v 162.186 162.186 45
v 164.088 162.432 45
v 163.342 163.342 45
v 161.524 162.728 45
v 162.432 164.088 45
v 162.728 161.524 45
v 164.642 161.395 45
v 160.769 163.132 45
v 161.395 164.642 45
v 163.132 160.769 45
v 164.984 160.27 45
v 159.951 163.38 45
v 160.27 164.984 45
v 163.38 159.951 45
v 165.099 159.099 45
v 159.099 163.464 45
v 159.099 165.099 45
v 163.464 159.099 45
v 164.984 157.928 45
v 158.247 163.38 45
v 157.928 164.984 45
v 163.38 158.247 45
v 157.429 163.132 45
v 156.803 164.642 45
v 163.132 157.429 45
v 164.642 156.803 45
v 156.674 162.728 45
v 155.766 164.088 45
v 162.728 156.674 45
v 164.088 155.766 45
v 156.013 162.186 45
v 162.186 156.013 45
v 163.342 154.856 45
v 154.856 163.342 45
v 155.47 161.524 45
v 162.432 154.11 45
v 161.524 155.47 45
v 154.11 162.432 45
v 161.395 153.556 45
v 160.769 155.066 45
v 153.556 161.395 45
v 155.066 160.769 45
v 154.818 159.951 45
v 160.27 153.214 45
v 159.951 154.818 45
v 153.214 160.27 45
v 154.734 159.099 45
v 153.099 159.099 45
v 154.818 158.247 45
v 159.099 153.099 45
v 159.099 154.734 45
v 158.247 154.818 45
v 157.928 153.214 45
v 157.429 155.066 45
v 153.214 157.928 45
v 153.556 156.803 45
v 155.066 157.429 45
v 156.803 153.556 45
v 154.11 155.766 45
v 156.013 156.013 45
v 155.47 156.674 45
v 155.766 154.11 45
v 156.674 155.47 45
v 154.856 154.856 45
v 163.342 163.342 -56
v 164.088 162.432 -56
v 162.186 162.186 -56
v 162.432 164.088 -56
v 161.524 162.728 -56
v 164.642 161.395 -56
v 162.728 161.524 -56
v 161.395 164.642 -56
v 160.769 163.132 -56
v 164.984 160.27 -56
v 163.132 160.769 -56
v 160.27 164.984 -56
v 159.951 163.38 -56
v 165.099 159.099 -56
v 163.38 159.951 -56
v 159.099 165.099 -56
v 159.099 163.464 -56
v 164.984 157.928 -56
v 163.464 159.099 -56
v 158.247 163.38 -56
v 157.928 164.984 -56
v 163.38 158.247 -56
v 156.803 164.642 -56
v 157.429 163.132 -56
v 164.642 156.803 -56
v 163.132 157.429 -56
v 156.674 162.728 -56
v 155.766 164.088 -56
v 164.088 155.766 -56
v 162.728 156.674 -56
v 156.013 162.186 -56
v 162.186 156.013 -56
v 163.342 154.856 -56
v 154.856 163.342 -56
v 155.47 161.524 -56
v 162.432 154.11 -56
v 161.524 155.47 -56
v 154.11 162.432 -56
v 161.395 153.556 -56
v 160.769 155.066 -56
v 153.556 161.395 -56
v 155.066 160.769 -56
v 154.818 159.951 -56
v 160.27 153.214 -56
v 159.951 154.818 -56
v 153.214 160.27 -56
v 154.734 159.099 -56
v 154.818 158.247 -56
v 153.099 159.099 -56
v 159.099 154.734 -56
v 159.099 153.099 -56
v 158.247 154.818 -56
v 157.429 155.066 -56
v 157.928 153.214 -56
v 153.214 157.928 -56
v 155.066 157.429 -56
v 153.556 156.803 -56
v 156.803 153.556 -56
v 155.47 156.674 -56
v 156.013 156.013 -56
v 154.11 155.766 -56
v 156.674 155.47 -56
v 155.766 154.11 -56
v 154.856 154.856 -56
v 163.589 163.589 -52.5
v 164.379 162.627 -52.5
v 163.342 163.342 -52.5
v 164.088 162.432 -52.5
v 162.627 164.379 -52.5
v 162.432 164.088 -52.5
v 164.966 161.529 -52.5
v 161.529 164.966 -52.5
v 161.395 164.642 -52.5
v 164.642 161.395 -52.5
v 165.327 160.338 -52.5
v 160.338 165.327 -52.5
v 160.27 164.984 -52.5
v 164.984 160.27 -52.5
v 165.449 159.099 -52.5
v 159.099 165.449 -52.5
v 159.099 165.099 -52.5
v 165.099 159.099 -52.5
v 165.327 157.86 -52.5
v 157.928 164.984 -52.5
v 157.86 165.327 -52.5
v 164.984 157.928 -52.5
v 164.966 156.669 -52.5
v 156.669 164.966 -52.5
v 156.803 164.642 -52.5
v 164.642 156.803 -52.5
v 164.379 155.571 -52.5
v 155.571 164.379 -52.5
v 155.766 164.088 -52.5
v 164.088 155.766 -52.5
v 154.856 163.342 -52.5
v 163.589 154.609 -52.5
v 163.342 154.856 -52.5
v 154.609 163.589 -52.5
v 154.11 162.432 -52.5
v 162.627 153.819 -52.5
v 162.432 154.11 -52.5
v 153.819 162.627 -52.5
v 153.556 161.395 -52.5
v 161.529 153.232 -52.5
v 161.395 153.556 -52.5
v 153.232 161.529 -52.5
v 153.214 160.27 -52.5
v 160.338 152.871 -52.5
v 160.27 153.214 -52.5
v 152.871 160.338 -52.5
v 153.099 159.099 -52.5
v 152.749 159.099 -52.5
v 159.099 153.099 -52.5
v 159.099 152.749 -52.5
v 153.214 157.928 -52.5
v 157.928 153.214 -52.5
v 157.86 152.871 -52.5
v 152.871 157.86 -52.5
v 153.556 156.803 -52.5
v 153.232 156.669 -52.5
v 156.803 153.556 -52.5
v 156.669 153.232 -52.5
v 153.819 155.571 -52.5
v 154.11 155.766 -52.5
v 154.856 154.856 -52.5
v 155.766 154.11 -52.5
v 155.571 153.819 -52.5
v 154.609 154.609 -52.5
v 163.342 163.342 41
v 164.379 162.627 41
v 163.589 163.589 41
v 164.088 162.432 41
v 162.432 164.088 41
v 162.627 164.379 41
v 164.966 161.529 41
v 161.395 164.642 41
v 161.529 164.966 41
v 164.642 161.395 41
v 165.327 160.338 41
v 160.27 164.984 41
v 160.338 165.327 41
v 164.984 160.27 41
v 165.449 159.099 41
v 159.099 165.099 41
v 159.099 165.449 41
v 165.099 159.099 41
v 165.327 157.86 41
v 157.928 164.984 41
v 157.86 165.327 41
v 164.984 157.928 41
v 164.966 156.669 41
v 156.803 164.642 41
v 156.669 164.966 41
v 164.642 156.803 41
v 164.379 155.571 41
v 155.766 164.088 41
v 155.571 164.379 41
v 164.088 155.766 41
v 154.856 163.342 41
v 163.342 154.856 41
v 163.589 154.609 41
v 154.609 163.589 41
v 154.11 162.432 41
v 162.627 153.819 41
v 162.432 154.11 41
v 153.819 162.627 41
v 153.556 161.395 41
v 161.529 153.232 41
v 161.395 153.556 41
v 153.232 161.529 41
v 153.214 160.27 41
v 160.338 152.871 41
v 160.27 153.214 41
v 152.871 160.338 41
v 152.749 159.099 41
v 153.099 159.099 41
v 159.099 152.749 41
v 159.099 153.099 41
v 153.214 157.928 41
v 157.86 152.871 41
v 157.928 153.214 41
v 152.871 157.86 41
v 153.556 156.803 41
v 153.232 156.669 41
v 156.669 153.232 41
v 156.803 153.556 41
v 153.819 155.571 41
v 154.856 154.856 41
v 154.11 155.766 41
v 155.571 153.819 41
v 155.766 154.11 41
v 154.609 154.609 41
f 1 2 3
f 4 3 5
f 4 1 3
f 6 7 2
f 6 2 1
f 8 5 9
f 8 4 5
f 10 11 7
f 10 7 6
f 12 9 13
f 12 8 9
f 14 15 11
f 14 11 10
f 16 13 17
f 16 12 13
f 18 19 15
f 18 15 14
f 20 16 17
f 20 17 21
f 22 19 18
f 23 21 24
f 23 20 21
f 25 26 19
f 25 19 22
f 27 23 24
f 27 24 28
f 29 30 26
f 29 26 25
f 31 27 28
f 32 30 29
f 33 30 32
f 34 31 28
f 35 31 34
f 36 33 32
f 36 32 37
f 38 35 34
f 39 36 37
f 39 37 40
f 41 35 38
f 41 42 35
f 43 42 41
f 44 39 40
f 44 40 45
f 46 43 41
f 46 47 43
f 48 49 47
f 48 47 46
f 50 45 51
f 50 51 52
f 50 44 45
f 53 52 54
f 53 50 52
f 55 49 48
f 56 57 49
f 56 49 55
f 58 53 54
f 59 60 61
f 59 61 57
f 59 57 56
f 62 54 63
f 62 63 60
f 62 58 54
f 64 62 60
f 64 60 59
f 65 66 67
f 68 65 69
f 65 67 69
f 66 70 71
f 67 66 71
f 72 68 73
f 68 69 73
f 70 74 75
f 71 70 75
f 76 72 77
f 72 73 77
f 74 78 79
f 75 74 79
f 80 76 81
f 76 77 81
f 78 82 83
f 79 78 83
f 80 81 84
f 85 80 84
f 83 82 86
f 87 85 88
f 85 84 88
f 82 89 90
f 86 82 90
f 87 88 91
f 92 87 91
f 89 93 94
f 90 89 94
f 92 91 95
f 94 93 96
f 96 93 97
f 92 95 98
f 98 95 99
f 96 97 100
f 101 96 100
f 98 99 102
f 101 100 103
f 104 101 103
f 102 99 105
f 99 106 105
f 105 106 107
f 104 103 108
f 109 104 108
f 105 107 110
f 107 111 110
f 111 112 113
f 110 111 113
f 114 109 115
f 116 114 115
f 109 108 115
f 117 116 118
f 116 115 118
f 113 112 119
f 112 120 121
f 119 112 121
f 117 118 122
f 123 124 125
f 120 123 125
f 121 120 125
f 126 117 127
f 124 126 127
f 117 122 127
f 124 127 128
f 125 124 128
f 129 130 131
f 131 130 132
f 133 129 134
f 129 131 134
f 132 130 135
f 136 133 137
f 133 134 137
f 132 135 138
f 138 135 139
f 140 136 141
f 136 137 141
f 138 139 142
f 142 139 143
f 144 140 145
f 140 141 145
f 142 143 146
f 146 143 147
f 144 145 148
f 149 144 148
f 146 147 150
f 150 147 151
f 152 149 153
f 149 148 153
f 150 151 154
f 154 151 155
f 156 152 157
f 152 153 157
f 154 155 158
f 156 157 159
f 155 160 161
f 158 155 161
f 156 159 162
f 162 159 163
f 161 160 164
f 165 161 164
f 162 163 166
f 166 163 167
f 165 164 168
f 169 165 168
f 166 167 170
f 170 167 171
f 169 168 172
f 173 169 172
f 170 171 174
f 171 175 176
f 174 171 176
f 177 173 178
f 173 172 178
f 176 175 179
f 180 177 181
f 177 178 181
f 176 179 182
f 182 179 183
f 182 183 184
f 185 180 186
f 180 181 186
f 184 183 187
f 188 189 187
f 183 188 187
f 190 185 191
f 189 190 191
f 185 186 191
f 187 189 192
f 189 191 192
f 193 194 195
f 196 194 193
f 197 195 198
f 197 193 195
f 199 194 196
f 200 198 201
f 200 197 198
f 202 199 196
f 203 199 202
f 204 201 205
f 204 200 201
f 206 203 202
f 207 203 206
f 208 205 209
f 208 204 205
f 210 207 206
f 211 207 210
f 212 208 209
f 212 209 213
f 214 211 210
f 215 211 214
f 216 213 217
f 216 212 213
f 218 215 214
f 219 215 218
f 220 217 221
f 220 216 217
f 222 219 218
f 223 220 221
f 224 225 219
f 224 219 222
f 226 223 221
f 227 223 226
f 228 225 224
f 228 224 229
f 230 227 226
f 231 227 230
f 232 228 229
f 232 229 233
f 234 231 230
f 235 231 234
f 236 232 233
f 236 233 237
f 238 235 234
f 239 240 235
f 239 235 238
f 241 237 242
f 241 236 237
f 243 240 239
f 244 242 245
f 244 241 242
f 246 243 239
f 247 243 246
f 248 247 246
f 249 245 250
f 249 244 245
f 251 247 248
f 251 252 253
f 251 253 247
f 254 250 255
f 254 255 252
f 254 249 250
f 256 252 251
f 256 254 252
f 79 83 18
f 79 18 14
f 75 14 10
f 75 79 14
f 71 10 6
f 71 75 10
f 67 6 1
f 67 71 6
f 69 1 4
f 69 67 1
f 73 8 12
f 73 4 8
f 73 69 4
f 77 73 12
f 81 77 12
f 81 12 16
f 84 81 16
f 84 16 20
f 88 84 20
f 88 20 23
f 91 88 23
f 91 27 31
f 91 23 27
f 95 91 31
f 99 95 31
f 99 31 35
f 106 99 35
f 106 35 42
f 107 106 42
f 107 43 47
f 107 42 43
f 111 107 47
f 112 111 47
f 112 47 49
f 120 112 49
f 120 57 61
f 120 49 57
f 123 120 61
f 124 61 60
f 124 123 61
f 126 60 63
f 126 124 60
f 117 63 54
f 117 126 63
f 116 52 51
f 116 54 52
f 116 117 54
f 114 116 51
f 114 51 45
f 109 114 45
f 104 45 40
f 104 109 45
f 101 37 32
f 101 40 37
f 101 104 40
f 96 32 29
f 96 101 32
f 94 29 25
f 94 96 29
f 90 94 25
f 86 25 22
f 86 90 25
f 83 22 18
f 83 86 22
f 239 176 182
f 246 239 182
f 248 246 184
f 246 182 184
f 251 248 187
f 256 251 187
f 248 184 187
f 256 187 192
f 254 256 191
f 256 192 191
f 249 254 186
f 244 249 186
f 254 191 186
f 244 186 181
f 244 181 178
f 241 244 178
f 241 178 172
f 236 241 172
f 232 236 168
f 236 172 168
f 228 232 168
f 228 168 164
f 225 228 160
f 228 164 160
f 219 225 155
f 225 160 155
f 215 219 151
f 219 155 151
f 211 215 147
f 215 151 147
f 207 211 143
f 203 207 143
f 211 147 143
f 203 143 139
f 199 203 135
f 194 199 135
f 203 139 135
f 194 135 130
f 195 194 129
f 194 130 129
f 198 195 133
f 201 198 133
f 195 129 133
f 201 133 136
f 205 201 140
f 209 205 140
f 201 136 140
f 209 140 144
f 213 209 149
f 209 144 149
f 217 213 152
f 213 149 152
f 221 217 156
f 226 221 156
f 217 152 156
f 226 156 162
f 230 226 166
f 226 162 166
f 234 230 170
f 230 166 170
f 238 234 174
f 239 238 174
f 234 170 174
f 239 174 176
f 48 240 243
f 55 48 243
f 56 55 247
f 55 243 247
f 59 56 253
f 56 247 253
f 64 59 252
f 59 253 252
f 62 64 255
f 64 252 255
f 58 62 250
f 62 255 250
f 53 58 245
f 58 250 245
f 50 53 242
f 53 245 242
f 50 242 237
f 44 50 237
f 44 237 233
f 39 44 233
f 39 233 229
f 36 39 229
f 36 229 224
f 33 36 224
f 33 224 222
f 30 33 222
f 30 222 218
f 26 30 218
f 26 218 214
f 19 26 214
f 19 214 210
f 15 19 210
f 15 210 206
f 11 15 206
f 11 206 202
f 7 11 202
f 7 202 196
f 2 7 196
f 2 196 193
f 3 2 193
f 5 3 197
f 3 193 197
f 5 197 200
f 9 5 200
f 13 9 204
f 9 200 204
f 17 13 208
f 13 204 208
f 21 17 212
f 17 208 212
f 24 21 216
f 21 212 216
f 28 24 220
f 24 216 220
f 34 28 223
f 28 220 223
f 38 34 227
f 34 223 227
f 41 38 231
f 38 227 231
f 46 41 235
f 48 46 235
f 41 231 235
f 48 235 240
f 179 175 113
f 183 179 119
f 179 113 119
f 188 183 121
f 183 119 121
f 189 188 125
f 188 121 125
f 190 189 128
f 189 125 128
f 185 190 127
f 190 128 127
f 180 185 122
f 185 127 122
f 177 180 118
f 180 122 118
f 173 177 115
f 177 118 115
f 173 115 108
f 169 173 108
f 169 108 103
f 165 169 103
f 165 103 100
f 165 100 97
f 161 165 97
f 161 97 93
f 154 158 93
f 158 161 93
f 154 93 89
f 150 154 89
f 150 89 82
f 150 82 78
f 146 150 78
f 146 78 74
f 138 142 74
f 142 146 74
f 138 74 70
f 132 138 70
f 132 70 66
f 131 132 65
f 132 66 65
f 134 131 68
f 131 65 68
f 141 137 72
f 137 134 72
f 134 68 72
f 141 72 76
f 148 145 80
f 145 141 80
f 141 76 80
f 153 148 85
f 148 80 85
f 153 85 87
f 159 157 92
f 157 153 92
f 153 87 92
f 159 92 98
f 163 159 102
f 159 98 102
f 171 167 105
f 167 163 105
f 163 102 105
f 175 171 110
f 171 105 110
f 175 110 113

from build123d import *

# Parameters (mm, degrees)
EXTRUDE1_DEPTH          = 45
EXTRUDE1_DEPTH_BACK     = 56
SKETCH1_R               = 6
EXTRUDE2_DEPTH          = 41
EXTRUDE2_DEPTH_BACK     = 52.5
SKETCH2_R               = 6.35
CUT_EXTRUDE1_DEPTH      = 241.588362675
CUT_EXTRUDE1_DEPTH_BACK = 241.588362675
SKETCH3_R               = 4.365


with BuildPart() as part:
    # Sketch1 → Extrude1 (new, two sides: drawn at the far end of the back side and taken through both)
    with BuildSketch(Plane.XY.offset(-EXTRUDE1_DEPTH_BACK)):
        with Locations(Location((159.099025767, 159.099025767, 0), (0, 0, 180))):
            Circle(SKETCH1_R)
    extrude(amount=EXTRUDE1_DEPTH + EXTRUDE1_DEPTH_BACK)

    # Sketch2 → Extrude2 (add, two sides: drawn at the far end of the back side and taken through both)
    with BuildSketch(Plane.XY.offset(-EXTRUDE2_DEPTH_BACK)):
        with Locations(Location((159.099025767, 159.099025767, 0), (0, 0, 180))):
            Circle(SKETCH2_R)
    extrude(amount=EXTRUDE2_DEPTH + EXTRUDE2_DEPTH_BACK)

    # Sketch3 → Cut-Extrude1 (cut, two sides: drawn at the far end of the back side and taken through both)
    with BuildSketch(Plane.XY.offset(-CUT_EXTRUDE1_DEPTH_BACK)):
        with Locations((159.099025767, 159.099025767)):
            Circle(SKETCH3_R)
    extrude(amount=CUT_EXTRUDE1_DEPTH + CUT_EXTRUDE1_DEPTH_BACK, mode=Mode.SUBTRACT)


solid = part.part
